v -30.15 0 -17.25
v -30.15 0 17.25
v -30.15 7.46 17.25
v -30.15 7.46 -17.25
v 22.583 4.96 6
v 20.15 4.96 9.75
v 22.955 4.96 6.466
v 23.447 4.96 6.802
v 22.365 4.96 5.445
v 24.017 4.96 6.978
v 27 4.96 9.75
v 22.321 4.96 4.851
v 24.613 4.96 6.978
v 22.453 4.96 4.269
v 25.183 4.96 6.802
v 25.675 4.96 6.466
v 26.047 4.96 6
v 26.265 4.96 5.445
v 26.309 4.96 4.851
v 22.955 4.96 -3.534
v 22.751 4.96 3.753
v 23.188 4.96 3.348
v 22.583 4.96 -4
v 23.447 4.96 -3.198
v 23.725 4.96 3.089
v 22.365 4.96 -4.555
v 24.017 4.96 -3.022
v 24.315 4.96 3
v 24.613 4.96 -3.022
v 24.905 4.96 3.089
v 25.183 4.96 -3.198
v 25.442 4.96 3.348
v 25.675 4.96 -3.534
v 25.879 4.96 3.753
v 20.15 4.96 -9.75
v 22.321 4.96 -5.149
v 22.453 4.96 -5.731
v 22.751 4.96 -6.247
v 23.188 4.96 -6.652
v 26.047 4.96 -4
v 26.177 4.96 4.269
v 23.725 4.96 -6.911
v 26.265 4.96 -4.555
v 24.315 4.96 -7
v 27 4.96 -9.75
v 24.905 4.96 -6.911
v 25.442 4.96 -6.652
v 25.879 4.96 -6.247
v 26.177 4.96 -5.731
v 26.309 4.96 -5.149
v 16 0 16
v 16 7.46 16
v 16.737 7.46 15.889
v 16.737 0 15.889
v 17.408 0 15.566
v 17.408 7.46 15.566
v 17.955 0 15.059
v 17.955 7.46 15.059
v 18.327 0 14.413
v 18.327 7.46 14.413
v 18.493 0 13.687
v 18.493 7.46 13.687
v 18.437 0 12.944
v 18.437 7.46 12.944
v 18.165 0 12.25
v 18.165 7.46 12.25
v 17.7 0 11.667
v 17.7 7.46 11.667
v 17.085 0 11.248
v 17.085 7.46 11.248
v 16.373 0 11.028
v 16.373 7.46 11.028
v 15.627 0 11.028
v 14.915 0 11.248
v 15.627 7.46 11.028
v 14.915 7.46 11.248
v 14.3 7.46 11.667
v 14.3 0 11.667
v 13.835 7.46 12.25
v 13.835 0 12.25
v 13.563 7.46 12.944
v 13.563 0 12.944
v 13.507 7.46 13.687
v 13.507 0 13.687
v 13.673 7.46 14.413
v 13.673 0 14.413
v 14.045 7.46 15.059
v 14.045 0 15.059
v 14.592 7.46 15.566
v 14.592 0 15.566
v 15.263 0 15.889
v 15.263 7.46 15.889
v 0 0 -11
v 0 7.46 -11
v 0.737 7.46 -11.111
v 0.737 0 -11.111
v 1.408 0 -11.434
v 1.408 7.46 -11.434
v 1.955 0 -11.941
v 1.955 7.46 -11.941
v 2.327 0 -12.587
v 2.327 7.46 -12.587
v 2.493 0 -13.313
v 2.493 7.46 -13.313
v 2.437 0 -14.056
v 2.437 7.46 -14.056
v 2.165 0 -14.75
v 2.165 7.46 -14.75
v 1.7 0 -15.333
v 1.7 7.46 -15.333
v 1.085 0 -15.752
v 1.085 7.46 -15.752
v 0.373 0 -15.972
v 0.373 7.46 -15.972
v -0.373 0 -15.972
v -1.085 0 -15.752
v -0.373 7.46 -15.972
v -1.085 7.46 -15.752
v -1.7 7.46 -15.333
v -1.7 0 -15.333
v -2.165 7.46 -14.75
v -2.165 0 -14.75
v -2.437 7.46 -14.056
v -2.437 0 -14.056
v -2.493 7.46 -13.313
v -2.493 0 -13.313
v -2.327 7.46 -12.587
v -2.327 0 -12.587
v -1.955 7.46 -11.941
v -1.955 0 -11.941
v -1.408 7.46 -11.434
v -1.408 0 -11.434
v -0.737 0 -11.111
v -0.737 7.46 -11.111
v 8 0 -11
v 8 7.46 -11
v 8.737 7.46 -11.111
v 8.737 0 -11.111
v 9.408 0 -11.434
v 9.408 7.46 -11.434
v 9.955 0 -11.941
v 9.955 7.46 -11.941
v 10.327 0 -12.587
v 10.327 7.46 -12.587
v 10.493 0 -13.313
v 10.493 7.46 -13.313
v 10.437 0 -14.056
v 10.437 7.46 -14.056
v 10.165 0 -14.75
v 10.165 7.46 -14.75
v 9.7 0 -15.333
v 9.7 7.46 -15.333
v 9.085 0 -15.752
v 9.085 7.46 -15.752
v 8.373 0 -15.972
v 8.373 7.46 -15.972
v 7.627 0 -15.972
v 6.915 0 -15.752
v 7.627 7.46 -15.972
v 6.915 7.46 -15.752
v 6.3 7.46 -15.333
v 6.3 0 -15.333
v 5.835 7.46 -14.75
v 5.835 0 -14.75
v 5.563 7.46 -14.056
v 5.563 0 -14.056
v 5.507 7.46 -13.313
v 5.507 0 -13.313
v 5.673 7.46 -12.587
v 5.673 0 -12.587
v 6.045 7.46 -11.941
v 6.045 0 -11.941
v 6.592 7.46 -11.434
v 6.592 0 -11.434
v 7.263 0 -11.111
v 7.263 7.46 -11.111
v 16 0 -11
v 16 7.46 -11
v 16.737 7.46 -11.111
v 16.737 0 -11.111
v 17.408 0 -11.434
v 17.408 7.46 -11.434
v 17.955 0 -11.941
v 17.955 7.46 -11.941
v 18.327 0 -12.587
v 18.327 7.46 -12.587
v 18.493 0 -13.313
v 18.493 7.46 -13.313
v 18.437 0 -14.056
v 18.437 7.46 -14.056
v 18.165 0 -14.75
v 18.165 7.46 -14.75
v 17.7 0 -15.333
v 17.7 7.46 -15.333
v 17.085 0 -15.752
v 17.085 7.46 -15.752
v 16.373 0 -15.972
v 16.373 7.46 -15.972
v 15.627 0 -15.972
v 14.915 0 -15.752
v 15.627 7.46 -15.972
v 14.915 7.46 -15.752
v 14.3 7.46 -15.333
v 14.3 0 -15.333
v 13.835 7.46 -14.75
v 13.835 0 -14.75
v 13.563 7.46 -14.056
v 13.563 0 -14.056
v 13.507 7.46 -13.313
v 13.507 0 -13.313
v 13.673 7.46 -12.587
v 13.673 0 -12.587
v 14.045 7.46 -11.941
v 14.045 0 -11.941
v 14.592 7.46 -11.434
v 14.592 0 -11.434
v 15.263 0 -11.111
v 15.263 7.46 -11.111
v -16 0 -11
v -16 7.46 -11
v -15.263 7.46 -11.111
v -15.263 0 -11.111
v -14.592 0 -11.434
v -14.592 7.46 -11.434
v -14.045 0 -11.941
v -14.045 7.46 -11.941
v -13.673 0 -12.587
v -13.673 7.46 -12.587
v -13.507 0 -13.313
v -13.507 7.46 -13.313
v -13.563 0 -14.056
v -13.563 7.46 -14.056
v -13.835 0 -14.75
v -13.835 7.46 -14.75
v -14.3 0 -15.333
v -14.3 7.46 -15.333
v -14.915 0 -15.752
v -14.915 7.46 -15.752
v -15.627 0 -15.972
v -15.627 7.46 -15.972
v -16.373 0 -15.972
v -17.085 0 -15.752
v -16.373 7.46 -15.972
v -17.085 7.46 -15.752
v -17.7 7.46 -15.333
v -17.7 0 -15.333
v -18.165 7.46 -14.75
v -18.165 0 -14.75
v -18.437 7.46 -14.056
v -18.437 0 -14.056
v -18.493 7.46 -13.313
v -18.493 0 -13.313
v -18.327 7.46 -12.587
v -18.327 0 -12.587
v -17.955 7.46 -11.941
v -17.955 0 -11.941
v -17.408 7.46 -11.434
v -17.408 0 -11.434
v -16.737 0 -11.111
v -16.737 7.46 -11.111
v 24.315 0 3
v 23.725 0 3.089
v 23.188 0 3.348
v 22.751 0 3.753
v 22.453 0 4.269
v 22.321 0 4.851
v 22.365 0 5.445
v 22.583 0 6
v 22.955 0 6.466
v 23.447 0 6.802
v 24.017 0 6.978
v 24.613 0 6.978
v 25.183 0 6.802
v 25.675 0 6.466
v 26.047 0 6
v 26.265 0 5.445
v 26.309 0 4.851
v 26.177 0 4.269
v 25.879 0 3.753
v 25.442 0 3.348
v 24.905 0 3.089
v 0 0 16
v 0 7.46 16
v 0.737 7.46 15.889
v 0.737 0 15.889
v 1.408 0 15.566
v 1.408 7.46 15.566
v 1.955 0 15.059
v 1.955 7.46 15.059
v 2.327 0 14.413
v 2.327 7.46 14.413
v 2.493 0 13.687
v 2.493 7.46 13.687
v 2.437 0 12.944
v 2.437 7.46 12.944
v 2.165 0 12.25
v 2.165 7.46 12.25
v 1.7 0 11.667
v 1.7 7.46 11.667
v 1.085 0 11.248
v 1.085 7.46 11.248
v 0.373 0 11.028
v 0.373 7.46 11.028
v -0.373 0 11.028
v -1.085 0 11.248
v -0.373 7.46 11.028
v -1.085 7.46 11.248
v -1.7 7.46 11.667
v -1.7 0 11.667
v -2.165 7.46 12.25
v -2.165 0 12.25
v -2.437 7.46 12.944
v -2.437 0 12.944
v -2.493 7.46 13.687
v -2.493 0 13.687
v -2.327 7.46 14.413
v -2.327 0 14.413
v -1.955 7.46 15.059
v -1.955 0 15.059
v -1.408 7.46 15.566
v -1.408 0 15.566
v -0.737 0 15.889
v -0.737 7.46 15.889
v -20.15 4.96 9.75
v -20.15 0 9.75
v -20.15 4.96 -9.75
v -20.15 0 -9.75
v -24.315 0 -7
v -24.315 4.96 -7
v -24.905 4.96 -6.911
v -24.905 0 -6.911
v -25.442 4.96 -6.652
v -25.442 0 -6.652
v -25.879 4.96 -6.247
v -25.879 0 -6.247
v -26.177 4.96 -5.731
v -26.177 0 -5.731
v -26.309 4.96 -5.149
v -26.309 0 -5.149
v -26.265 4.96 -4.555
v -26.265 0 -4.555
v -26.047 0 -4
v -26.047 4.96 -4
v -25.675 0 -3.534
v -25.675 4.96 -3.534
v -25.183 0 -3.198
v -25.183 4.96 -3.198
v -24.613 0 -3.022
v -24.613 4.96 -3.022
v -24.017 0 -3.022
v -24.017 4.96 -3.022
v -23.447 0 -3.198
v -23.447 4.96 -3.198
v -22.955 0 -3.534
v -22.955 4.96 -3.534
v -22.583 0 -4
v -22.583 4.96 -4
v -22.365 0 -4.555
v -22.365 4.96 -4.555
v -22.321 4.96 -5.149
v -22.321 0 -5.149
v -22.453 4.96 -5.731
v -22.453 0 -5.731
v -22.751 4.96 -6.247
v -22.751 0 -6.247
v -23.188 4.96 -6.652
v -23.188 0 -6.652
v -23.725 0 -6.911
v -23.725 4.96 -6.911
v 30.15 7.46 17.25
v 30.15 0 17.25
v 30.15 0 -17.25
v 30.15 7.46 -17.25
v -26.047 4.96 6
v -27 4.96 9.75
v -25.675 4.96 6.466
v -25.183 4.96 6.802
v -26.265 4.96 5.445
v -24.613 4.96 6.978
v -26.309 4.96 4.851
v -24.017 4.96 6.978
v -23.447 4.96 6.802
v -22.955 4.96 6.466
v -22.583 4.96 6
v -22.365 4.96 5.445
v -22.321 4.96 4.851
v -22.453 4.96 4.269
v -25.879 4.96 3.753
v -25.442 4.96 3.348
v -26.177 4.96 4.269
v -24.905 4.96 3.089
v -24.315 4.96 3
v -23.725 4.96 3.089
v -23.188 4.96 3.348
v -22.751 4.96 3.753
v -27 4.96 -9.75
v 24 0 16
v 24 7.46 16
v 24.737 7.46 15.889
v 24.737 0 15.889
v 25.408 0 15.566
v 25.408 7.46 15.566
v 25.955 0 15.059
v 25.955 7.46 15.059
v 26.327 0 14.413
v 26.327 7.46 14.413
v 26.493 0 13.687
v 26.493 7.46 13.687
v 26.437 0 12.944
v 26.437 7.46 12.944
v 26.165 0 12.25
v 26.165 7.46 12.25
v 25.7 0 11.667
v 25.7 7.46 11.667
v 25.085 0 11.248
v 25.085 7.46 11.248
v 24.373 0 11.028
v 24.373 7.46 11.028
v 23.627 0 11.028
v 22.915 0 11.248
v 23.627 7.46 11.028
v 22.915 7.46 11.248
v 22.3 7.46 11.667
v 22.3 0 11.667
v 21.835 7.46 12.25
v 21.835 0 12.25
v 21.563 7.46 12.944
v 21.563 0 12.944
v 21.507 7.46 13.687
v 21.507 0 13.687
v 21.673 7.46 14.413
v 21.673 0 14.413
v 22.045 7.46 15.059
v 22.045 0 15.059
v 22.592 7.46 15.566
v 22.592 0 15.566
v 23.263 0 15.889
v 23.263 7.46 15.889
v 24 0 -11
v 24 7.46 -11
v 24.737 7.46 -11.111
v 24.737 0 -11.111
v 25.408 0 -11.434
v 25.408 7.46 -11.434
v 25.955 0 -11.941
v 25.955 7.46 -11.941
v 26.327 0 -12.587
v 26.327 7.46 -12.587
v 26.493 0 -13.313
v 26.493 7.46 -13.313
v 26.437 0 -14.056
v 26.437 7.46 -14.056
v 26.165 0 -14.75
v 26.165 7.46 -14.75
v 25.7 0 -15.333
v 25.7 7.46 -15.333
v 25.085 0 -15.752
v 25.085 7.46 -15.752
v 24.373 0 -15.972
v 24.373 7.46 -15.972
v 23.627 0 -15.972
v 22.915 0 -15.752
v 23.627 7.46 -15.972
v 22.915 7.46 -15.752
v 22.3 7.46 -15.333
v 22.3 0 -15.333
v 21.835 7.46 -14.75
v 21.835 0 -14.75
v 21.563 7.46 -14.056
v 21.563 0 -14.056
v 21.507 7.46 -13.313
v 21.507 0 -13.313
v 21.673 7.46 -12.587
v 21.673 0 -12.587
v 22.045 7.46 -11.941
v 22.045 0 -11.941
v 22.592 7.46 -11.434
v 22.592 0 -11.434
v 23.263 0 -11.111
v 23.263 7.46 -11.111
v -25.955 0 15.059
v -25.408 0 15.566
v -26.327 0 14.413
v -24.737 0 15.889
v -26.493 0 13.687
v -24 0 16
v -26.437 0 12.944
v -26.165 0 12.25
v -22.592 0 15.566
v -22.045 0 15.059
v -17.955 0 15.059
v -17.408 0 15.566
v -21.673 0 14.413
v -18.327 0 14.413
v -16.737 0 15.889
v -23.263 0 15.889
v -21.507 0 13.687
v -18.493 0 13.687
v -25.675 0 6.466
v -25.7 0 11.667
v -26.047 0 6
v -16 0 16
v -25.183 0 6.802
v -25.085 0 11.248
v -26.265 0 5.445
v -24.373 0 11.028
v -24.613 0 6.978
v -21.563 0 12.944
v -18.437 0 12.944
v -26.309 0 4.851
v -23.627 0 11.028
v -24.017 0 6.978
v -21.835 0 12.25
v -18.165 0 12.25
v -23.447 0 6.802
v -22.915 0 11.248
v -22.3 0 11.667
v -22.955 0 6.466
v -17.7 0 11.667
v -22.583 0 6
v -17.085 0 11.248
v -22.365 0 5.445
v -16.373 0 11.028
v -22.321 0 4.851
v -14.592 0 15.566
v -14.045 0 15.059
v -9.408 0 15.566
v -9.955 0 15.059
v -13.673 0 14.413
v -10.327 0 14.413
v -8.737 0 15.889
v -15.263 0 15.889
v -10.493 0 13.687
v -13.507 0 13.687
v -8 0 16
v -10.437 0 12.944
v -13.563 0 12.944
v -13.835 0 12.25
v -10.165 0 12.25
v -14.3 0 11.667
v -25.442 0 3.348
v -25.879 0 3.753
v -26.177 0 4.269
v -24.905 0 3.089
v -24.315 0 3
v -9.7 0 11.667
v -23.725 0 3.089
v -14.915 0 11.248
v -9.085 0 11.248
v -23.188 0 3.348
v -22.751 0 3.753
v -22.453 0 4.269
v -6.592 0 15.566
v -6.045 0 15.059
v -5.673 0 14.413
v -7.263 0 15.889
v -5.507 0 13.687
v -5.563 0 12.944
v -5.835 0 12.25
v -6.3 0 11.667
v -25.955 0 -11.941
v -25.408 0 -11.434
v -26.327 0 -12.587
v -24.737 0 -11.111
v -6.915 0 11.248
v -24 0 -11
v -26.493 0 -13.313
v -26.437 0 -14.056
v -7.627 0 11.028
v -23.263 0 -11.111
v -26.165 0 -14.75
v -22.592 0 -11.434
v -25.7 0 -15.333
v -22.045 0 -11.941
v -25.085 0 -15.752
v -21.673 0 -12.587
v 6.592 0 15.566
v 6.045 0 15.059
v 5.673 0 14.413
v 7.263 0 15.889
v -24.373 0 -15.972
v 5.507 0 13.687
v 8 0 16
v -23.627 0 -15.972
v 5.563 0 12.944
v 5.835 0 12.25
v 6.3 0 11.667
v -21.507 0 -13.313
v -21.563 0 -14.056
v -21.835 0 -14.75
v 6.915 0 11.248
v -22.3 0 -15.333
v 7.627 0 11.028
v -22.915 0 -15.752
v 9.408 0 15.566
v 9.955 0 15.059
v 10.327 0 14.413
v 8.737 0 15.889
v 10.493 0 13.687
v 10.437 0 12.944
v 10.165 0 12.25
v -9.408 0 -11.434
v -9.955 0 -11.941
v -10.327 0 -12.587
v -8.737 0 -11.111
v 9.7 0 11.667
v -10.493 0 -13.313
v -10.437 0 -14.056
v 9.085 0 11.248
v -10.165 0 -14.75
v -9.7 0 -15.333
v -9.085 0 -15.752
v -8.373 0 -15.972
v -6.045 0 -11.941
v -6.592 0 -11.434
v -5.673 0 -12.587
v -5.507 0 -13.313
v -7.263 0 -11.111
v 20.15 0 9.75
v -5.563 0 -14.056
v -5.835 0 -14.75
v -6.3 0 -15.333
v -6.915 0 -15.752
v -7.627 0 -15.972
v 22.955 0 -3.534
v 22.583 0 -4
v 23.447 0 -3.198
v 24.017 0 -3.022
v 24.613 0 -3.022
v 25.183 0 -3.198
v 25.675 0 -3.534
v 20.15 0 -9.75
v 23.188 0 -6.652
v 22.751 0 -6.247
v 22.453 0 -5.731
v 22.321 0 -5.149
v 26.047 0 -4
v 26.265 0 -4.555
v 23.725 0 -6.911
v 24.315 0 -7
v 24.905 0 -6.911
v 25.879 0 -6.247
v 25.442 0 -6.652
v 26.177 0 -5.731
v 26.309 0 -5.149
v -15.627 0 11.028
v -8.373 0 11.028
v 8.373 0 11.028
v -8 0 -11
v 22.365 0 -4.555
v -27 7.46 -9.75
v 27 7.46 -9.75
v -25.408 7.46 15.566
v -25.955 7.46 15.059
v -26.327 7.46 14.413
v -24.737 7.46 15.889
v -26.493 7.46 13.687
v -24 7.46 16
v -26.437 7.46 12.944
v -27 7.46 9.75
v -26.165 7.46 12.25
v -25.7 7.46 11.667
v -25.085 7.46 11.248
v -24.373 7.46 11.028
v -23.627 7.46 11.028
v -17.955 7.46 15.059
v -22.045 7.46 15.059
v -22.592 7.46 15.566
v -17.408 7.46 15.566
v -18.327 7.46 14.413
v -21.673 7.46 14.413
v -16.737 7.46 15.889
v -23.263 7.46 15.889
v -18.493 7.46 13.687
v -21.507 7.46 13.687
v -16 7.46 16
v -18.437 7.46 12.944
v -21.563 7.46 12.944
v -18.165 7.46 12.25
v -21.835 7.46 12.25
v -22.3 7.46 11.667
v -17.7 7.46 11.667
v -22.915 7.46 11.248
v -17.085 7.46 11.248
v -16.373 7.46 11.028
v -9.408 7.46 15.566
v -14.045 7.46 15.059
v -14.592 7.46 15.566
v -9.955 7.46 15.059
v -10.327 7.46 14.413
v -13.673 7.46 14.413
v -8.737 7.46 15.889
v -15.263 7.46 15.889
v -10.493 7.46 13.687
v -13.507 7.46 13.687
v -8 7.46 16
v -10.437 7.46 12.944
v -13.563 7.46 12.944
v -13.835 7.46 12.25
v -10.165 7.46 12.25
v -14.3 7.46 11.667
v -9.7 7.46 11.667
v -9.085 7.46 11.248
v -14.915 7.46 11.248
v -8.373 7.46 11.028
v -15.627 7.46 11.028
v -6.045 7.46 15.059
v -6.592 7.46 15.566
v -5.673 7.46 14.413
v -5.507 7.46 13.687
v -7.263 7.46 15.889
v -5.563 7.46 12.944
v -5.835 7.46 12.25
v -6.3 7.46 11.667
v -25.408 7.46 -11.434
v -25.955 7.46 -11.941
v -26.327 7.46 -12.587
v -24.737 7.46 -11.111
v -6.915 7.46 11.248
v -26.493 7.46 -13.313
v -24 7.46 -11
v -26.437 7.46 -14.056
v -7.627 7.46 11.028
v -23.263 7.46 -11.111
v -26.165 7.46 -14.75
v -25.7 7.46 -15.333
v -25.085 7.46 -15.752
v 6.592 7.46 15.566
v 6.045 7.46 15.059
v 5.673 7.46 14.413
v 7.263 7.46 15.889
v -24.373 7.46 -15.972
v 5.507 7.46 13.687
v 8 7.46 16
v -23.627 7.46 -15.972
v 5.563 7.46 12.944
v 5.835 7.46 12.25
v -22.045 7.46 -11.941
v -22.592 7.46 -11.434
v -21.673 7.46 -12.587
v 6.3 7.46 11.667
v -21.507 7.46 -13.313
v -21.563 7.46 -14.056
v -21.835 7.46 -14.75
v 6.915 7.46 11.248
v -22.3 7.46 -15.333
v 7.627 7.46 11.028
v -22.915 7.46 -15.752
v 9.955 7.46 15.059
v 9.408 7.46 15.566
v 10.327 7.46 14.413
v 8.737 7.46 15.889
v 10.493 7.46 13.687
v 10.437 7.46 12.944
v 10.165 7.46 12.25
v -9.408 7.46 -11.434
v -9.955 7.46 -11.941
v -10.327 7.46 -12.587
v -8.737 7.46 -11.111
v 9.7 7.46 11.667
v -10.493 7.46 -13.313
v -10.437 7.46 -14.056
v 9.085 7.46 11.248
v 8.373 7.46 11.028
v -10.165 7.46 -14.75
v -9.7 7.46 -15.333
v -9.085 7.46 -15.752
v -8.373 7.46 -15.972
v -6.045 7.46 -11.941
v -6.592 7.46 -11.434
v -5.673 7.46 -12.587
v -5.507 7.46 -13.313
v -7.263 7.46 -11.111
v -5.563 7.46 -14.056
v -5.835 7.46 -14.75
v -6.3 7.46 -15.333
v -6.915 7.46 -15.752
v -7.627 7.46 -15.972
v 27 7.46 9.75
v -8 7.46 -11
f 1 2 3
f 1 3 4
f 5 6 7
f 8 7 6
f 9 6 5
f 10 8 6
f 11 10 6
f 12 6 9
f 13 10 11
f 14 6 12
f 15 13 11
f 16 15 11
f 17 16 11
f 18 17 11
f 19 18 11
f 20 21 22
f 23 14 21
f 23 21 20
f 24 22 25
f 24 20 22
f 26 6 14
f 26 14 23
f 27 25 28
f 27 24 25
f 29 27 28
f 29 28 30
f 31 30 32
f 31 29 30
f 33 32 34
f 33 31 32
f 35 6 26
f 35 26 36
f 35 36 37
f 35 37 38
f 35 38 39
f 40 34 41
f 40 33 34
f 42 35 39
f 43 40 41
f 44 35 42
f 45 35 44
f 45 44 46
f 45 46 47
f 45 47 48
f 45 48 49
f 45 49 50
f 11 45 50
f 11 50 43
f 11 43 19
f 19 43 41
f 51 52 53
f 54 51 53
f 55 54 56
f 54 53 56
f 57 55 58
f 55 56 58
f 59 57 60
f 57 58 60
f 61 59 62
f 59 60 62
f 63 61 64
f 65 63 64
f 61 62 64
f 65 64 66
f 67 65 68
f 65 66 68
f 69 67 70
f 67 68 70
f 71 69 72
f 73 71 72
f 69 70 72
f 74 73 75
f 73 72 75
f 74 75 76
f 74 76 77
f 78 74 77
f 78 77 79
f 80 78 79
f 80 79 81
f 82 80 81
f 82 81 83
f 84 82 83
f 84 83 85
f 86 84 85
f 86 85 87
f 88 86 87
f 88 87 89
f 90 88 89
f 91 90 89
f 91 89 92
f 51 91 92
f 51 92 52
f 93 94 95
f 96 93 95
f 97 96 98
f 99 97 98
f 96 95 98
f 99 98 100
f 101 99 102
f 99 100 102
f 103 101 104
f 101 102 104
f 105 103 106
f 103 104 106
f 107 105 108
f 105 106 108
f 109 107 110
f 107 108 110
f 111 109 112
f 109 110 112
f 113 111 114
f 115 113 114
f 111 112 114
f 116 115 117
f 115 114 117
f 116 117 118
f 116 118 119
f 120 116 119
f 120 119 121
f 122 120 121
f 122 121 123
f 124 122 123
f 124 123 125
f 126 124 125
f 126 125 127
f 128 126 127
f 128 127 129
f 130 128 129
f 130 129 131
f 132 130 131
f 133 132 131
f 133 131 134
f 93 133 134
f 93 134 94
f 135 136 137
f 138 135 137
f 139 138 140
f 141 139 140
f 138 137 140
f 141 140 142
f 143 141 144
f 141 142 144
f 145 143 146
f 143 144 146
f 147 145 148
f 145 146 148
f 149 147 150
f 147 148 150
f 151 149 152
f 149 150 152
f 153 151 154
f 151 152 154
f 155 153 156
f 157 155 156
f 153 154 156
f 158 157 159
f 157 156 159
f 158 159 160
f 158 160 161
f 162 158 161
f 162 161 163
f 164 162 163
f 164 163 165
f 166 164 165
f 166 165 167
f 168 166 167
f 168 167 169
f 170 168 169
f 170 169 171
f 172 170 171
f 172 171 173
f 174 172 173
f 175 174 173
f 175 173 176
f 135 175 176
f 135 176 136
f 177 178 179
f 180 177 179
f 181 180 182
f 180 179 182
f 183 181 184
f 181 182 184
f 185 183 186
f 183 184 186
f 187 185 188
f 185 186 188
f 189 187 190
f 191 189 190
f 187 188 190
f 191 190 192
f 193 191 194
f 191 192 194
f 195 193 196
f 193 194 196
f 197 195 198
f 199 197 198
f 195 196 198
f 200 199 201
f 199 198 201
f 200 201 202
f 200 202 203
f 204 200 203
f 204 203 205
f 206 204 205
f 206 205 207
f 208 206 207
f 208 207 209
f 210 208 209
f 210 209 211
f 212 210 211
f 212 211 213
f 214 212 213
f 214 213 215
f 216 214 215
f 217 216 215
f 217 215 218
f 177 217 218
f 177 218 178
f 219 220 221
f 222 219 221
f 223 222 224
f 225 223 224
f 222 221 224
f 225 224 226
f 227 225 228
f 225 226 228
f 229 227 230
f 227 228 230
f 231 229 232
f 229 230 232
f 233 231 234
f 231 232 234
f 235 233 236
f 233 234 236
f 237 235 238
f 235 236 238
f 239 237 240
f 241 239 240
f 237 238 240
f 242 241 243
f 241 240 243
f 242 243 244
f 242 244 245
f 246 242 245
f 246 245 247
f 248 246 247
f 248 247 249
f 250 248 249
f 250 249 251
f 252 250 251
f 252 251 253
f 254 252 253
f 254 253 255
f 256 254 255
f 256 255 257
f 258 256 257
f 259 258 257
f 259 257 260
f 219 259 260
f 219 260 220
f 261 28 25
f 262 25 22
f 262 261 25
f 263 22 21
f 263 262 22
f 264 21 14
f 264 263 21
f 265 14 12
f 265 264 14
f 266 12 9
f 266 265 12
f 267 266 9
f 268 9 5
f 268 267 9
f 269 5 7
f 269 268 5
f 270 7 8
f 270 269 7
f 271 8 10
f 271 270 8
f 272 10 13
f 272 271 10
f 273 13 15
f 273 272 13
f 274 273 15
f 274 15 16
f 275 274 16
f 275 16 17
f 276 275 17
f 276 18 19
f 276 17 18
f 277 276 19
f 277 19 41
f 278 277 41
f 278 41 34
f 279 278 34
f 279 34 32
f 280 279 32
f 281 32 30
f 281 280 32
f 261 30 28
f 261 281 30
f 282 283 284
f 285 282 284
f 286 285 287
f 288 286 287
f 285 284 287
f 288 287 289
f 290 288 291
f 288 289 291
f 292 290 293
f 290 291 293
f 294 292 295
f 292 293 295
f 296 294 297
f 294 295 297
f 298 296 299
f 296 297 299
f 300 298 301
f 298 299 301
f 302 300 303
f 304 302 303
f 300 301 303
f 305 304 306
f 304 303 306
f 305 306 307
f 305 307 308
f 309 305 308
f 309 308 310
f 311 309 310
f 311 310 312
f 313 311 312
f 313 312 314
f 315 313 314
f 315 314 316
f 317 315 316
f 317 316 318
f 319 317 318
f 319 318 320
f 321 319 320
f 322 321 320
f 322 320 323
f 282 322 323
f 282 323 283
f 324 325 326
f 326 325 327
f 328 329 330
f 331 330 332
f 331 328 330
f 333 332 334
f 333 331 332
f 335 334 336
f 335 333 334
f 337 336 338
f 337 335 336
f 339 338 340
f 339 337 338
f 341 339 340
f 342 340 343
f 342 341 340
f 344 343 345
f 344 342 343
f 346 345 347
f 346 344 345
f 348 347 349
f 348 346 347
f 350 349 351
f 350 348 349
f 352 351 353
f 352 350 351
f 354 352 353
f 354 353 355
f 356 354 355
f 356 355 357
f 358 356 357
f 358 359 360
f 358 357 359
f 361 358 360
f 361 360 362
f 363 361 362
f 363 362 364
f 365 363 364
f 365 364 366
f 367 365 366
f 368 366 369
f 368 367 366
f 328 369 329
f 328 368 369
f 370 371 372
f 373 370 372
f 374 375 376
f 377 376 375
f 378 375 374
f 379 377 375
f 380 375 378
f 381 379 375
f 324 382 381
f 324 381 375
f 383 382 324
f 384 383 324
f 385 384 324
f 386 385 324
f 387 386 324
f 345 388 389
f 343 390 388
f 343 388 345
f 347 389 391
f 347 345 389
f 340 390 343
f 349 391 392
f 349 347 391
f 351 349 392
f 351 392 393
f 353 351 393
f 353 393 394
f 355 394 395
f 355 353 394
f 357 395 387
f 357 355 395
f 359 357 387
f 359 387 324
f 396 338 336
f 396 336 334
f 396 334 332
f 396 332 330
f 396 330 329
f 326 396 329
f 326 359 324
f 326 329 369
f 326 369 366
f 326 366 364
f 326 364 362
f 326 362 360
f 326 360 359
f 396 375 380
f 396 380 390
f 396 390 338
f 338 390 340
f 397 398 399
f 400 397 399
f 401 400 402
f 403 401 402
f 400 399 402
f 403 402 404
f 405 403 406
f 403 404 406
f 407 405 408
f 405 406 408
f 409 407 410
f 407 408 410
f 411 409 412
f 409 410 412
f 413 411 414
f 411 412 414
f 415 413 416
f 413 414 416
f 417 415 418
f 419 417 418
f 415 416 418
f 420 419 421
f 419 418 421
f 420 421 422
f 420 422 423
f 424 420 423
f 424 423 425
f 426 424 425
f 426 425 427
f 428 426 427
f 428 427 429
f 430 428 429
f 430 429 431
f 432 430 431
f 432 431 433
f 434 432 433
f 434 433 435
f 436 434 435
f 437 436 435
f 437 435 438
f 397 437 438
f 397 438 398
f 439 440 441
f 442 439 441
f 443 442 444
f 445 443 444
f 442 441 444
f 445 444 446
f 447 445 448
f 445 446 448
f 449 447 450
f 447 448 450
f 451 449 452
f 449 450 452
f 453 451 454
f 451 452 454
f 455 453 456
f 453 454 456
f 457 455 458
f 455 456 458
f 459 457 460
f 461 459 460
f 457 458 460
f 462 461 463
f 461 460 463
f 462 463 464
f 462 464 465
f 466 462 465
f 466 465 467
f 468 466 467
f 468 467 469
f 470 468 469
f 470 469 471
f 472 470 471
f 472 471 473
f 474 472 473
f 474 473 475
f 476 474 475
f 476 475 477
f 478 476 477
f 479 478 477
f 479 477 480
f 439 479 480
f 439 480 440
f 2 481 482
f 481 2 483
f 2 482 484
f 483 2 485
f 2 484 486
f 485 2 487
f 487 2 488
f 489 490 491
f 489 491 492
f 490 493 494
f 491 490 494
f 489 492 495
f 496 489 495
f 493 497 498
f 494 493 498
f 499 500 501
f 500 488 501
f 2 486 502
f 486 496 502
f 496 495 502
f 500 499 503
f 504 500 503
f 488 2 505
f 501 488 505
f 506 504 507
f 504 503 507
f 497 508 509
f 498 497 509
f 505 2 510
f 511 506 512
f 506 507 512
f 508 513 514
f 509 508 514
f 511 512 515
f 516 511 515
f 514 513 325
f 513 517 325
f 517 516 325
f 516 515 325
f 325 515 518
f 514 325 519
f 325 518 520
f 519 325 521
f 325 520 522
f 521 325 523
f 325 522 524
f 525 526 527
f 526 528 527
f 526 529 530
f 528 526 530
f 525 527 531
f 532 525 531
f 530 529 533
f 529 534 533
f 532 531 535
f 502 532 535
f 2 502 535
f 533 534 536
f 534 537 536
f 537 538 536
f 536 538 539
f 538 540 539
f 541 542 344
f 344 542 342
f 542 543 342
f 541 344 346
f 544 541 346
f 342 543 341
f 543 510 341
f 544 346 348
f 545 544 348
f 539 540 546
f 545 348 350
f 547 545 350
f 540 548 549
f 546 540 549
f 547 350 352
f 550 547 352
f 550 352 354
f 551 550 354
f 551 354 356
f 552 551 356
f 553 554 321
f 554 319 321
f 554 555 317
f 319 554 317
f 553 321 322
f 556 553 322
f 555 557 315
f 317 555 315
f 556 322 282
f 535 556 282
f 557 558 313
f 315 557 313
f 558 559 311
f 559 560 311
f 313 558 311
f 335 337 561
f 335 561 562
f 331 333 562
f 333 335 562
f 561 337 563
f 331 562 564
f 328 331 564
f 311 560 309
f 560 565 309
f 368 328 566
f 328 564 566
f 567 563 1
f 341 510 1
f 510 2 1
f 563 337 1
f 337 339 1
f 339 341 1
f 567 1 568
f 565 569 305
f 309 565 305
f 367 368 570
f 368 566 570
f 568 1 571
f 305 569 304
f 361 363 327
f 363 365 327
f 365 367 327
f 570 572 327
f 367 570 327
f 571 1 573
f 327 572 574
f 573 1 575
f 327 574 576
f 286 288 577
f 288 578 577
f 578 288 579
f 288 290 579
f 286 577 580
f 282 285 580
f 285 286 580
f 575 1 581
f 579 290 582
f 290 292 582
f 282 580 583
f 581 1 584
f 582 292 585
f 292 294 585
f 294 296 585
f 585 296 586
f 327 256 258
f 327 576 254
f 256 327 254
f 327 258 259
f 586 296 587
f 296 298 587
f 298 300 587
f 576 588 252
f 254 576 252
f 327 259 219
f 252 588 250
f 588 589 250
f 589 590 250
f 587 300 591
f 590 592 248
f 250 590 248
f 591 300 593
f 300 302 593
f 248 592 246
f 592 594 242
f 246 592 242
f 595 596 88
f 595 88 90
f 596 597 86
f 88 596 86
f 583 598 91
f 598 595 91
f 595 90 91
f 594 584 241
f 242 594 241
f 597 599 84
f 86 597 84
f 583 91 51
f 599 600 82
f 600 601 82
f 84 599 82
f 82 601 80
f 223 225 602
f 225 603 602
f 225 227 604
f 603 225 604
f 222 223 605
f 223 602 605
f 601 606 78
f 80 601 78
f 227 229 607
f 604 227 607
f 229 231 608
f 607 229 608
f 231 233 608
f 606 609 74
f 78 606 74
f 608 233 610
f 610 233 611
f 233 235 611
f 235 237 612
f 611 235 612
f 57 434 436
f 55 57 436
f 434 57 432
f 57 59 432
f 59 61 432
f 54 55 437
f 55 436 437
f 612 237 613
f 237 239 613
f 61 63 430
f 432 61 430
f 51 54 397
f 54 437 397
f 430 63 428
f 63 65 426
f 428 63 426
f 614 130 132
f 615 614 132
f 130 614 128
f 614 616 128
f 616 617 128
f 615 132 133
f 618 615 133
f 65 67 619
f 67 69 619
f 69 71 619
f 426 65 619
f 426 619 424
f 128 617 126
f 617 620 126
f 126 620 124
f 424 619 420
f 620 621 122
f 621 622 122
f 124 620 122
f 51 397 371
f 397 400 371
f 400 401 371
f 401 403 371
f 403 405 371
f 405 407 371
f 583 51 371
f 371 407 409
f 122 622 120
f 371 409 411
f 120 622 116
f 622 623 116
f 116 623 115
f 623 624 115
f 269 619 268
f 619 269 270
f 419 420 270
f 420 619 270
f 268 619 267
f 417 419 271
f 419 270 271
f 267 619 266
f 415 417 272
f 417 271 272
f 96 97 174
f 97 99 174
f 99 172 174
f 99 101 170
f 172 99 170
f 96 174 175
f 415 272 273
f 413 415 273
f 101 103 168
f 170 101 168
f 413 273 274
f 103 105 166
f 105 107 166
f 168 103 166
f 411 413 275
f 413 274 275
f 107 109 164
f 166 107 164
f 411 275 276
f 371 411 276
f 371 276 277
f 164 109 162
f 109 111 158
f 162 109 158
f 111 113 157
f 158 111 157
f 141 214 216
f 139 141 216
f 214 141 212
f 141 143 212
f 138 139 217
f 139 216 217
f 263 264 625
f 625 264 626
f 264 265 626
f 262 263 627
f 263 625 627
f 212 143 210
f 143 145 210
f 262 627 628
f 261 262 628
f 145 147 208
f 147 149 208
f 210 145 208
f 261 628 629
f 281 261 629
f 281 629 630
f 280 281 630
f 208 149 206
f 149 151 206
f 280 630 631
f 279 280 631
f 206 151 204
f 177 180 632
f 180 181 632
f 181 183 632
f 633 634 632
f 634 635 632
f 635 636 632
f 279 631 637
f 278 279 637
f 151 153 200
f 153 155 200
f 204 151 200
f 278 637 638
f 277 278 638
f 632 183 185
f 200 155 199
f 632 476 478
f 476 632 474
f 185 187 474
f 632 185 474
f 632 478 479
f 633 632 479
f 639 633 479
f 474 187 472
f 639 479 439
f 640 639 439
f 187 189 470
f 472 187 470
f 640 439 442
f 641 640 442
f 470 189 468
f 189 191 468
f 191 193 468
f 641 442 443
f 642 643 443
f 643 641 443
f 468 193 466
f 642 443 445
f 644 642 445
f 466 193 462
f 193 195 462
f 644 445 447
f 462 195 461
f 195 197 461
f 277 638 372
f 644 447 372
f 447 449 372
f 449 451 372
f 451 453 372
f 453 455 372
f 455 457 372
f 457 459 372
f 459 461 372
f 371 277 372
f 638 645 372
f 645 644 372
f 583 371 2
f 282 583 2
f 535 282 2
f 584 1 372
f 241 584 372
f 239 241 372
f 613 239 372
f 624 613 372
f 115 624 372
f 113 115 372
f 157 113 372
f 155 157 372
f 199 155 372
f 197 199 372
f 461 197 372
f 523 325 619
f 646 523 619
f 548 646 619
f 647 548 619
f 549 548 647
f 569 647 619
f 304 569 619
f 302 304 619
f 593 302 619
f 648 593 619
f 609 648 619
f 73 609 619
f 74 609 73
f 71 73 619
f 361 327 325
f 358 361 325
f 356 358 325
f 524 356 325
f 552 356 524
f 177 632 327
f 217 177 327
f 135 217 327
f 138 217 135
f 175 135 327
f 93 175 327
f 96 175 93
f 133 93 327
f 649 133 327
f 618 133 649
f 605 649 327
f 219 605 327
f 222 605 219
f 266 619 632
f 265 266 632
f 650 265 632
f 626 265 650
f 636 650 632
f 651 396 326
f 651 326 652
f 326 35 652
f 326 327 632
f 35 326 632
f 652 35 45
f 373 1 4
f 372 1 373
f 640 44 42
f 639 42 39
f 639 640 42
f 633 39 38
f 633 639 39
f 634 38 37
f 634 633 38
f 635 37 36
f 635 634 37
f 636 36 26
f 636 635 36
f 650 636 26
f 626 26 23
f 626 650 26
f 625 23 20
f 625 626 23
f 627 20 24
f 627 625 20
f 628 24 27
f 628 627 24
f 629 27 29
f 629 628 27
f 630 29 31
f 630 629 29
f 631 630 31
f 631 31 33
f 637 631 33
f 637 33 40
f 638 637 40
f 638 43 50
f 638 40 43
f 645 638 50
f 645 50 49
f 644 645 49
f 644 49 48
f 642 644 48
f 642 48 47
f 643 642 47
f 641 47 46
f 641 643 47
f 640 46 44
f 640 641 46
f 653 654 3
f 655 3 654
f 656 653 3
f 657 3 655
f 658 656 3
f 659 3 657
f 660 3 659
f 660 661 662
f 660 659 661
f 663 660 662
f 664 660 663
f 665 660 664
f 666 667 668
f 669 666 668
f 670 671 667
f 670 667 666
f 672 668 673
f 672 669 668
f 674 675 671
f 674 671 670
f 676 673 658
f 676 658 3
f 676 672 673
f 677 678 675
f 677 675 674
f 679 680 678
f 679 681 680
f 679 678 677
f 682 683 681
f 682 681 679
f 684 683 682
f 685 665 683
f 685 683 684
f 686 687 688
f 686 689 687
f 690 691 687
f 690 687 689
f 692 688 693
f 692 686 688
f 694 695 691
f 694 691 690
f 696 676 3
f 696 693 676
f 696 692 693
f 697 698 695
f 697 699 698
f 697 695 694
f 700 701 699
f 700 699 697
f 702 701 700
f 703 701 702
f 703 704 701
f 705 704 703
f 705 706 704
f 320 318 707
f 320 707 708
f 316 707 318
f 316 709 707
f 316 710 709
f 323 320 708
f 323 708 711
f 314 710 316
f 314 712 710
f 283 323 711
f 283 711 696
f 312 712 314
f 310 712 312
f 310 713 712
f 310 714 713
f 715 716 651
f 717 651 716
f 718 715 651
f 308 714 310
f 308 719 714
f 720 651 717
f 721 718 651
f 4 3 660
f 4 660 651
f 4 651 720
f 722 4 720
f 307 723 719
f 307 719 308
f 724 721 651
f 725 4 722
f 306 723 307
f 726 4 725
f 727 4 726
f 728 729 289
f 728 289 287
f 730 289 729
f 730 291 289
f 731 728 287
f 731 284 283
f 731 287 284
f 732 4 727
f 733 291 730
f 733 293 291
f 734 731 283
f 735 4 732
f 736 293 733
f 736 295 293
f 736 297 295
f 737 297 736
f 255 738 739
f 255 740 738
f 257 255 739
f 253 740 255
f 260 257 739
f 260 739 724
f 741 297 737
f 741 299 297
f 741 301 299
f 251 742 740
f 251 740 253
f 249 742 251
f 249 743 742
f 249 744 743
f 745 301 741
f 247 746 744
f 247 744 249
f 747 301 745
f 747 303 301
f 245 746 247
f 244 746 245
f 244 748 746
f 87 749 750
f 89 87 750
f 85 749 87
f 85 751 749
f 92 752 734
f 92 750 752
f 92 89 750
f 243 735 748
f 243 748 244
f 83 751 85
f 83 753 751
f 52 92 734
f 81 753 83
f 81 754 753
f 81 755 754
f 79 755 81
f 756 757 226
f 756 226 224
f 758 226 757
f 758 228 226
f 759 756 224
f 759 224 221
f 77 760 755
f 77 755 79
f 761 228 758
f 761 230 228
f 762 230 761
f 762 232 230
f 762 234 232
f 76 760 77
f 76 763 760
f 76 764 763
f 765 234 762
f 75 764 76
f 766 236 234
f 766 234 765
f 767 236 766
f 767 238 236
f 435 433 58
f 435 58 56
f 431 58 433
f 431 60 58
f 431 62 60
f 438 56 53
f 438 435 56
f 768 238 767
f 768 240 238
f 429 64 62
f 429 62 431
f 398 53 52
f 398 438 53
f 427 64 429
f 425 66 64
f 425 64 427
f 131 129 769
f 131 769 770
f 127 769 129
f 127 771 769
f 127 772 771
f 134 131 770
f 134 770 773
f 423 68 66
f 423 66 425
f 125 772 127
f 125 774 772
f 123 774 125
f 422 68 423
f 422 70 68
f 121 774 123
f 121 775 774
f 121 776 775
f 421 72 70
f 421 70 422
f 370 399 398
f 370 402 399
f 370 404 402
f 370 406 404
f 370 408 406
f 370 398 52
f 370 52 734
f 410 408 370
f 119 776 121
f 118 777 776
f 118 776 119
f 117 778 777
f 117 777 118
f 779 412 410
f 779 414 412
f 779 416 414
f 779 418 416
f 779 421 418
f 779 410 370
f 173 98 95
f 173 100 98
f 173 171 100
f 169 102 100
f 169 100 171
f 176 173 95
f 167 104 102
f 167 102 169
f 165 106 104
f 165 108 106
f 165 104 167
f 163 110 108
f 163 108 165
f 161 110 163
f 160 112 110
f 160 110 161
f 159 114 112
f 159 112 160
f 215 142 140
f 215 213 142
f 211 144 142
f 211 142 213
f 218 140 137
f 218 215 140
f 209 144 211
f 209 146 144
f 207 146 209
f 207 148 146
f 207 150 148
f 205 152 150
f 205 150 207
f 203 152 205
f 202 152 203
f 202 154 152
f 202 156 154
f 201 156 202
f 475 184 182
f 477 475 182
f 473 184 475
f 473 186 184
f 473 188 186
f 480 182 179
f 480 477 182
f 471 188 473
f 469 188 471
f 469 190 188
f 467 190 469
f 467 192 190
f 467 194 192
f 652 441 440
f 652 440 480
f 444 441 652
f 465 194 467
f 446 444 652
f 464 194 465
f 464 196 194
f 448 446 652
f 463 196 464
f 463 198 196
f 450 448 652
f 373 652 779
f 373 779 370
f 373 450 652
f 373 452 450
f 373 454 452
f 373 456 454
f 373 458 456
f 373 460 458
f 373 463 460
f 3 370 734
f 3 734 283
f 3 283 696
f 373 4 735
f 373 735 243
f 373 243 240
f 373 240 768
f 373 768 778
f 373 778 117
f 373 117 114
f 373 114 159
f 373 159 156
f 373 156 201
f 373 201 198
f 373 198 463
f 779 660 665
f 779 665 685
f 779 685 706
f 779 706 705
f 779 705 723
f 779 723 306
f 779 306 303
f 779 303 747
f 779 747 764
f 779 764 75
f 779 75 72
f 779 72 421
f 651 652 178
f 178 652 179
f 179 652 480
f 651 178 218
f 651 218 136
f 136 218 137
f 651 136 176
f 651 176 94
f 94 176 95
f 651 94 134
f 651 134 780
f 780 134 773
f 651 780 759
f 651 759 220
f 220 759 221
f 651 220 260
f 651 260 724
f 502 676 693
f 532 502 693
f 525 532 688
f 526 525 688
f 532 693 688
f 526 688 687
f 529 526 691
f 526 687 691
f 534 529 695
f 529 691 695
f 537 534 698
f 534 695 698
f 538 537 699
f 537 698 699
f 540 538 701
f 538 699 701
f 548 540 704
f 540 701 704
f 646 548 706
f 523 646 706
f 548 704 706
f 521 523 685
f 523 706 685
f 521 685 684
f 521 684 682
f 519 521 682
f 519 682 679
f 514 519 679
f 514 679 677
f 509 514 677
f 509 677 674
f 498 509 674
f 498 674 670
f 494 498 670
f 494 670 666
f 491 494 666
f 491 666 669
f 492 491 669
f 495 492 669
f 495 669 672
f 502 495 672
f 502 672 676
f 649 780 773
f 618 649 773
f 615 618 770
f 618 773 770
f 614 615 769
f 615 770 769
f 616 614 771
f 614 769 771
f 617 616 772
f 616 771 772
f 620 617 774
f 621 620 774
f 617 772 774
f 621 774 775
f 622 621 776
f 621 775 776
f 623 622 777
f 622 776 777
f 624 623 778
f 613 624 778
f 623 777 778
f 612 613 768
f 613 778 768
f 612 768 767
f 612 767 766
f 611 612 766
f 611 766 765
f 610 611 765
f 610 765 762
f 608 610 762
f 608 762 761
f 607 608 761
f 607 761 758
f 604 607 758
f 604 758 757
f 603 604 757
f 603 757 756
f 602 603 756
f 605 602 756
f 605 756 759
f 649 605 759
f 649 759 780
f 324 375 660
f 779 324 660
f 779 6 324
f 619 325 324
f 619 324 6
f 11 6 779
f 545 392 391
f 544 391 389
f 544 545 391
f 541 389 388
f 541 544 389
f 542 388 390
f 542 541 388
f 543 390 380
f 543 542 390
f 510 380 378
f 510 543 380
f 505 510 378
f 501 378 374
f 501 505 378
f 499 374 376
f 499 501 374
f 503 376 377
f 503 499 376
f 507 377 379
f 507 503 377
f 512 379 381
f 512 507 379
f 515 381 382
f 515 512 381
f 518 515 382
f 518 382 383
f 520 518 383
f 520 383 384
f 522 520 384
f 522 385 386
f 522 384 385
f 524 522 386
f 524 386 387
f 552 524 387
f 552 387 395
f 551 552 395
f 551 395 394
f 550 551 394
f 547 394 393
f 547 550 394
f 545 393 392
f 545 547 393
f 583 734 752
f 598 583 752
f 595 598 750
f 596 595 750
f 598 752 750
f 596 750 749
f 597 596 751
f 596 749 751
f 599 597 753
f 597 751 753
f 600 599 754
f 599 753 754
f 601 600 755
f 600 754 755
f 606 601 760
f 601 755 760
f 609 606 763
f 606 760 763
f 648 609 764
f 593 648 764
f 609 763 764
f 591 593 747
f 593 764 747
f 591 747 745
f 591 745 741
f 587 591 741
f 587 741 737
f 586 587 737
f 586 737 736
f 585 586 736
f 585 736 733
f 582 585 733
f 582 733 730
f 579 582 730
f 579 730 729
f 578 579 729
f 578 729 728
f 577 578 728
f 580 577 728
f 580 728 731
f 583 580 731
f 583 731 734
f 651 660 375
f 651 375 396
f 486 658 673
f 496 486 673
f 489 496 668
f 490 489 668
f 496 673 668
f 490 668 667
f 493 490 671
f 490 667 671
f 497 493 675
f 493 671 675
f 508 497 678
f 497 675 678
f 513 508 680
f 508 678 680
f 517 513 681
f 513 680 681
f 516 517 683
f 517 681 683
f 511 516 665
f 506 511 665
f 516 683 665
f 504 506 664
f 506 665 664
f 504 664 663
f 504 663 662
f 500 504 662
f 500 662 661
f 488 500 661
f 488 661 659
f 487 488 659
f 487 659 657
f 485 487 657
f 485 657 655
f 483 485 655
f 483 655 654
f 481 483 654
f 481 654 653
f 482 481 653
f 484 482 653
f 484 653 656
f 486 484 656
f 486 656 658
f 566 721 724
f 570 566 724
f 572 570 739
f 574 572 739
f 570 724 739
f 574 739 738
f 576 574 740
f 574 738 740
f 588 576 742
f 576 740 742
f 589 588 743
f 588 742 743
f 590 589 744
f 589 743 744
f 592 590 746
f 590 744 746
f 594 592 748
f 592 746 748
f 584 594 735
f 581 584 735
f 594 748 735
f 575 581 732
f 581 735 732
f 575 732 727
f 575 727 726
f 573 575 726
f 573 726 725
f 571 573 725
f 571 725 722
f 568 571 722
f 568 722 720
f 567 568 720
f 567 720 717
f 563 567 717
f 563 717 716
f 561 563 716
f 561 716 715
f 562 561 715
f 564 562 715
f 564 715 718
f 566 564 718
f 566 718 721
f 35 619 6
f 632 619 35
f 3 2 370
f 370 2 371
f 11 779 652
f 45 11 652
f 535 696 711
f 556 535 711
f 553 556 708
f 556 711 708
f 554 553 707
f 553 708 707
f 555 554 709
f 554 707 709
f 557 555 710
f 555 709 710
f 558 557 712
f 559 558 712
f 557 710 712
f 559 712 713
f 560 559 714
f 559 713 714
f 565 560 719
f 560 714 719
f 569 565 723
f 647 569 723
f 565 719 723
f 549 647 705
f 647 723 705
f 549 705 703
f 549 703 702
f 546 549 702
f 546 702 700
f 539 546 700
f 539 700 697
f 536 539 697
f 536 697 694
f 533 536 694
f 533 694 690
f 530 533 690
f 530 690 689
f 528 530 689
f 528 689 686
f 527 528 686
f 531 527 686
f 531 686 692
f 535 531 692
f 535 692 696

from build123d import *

# Parameters (mm, degrees)
SKETCH1_W           = 60.3
SKETCH1_H           = 34.5
SKETCH1_R           = 2
SKETCH1_W_2         = 40.3
SKETCH1_H_2         = 19.5
BOSS_EXTRUDE1_DEPTH = 7.46
SKETCH3_W           = 54
SKETCH3_H           = 19.5
CUT_EXTRUDE1_DEPTH  = 2.5
SKETCH4_R           = 2.5
CUT_EXTRUDE2_DEPTH  = 36.527969264


with BuildPart() as part:
    # Sketch1 → Boss-Extrude1 (new body)
    with BuildSketch(Plane(origin=(0, 0, 0), x_dir=(1, 0, 0), z_dir=(0, 1, 0))):
        Rectangle(SKETCH1_W, SKETCH1_H)
        with Locations(Location((-24.315, -5, 0), (0, 0, 90))):
            Circle(SKETCH1_R, mode=Mode.SUBTRACT)
        with Locations(Location((-24.315, 5, 0), (0, 0, 90))):
            Circle(SKETCH1_R, mode=Mode.SUBTRACT)
        with Locations(Location((24.315, -5, 0), (0, 0, 90))):
            Circle(SKETCH1_R, mode=Mode.SUBTRACT)
        with Locations(Location((24.315, 5, 0), (0, 0, 90))):
            Circle(SKETCH1_R, mode=Mode.SUBTRACT)
        Rectangle(SKETCH1_W_2, SKETCH1_H_2, mode=Mode.SUBTRACT)
    extrude(amount=BOSS_EXTRUDE1_DEPTH)

    # Sketch3 → Cut-Extrude1 (cut)
    with BuildSketch(Plane(origin=(0, 7.46, 0), x_dir=(1, 0, 0), z_dir=(0, 1, 0))):
        Rectangle(SKETCH3_W, SKETCH3_H)
    extrude(amount=-CUT_EXTRUDE1_DEPTH, mode=Mode.SUBTRACT)

    # Sketch4 → Cut-Extrude2 (cut, through all)
    with BuildSketch(Plane(origin=(0, 7.46, 0), x_dir=(1, 0, 0), z_dir=(0, 1, 0))):
        with Locations(Location((0, 13.5, 0), (0, 0, 270))):
            Circle(SKETCH4_R)
        with Locations(Location((8, 13.5, 0), (0, 0, 270))):
            Circle(SKETCH4_R)
        with Locations(Location((16, 13.5, 0), (0, 0, 270))):
            Circle(SKETCH4_R)
        with Locations(Location((24, 13.5, 0), (0, 0, 270))):
            Circle(SKETCH4_R)
        with Locations(Location((-24, 13.5, 0), (0, 0, 270))):
            Circle(SKETCH4_R)
        with Locations(Location((-16, 13.5, 0), (0, 0, 270))):
            Circle(SKETCH4_R)
        with Locations(Location((-8, 13.5, 0), (0, 0, 270))):
            Circle(SKETCH4_R)
        with Locations(Location((24, -13.5, 0), (0, 0, 270))):
            Circle(SKETCH4_R)
        with Locations(Location((16, -13.5, 0), (0, 0, 270))):
            Circle(SKETCH4_R)
        with Locations(Location((8, -13.5, 0), (0, 0, 270))):
            Circle(SKETCH4_R)
        with Locations(Location((0, -13.5, 0), (0, 0, 270))):
            Circle(SKETCH4_R)
        with Locations(Location((-8, -13.5, 0), (0, 0, 270))):
            Circle(SKETCH4_R)
        with Locations(Location((-16, -13.5, 0), (0, 0, 270))):
            Circle(SKETCH4_R)
        with Locations(Location((-24, -13.5, 0), (0, 0, 270))):
            Circle(SKETCH4_R)
    extrude(amount=-CUT_EXTRUDE2_DEPTH, mode=Mode.SUBTRACT)


solid = part.part
